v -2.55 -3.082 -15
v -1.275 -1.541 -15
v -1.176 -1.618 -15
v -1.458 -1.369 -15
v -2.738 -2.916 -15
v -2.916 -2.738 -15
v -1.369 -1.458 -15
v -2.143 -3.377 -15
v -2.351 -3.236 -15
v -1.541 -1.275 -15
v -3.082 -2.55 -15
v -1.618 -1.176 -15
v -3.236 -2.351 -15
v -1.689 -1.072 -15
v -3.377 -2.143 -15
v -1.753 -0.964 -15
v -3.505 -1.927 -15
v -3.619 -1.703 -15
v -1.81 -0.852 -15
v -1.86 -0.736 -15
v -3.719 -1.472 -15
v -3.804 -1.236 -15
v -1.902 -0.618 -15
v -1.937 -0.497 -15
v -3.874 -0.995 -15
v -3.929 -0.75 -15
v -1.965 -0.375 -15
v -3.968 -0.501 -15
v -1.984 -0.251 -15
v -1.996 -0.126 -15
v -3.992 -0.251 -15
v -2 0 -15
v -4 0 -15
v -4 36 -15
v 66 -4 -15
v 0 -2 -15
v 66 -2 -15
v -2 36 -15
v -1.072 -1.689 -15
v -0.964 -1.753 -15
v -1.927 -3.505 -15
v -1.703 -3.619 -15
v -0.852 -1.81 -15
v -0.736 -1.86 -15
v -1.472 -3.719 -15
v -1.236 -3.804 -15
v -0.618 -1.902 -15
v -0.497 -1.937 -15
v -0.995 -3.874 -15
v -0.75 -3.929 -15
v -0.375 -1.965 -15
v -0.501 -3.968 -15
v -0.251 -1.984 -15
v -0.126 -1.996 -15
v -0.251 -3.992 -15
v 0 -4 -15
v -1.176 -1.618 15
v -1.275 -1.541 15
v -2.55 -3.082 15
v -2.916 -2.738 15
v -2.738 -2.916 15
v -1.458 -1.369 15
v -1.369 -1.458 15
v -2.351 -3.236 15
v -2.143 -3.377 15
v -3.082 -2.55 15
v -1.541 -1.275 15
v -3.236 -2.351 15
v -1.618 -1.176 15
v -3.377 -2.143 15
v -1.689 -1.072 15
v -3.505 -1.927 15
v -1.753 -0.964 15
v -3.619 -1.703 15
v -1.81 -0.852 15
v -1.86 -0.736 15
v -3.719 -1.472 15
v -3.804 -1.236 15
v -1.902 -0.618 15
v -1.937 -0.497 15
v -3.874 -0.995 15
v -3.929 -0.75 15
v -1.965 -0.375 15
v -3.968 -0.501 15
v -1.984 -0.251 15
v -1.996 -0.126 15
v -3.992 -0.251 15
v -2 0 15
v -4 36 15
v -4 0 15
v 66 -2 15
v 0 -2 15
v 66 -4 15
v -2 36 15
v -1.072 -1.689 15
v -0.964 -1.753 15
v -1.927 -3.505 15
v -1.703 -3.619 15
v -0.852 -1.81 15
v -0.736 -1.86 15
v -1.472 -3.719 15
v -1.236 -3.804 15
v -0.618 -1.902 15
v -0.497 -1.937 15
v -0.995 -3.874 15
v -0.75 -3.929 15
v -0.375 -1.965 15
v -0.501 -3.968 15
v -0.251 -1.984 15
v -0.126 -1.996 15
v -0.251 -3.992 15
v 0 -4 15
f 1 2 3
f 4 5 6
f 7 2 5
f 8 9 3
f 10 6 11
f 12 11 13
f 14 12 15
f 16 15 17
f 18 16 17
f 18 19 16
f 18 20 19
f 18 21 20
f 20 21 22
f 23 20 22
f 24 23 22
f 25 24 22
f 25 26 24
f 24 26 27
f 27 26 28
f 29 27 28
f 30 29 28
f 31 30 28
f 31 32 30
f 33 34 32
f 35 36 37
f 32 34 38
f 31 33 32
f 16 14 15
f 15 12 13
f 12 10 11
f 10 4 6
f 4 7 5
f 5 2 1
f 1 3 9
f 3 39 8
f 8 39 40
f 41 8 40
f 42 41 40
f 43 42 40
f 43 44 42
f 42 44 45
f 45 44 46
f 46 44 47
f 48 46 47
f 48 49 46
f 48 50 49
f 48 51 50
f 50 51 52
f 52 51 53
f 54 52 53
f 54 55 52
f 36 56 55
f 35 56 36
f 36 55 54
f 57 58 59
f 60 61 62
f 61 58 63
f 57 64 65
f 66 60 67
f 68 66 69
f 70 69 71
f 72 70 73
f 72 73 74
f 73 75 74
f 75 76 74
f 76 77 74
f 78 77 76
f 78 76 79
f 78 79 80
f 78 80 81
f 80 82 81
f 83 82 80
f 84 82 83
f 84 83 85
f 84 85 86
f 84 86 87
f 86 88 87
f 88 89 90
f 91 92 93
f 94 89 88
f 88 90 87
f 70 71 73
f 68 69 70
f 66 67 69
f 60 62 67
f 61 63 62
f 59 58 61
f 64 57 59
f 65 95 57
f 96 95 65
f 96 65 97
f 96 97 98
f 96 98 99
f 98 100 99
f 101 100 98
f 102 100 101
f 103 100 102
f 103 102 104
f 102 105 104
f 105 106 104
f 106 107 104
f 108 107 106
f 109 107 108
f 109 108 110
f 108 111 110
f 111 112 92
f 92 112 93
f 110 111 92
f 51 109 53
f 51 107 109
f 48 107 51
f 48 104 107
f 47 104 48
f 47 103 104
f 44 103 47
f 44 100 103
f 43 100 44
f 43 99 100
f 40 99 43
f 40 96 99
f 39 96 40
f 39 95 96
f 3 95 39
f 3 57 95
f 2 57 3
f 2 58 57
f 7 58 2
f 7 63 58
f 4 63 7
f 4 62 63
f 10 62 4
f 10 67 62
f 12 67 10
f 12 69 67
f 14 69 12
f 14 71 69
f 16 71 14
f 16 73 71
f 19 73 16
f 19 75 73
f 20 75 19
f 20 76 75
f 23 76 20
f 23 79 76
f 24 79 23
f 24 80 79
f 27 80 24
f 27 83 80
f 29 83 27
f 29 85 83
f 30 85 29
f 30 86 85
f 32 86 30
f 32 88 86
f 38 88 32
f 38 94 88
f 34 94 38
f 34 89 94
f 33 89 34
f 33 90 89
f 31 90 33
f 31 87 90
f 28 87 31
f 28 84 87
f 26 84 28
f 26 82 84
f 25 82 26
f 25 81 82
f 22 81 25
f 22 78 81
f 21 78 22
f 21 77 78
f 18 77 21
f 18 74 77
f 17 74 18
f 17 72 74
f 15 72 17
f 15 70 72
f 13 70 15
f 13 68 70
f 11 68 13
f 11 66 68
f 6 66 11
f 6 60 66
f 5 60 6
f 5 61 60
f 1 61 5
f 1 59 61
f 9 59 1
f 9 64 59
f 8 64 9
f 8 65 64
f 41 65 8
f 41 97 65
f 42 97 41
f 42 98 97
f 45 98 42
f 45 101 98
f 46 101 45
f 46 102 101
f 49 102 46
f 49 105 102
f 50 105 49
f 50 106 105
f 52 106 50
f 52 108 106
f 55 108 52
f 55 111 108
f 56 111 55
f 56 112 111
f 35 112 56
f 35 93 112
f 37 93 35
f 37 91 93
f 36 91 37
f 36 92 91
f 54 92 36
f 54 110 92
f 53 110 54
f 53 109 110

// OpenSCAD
// Title: Sheet-Metal L-Bracket
// Description: Parametric 90-degree sheet-metal L-bracket with a single bend.
// Outside lengths: 70 mm and 40 mm, width: 30 mm, sheet thickness: 2.0 mm.

// --- Design Parameters ---
thickness = 2.0;         // Sheet metal thickness (mm)
inside_radius = 2.0;     // Inside bend radius (mm)
outside_length_1 = 70.0; // Outside length of flange 1 (mm)
outside_length_2 = 40.0; // Outside length of flange 2 (mm)
width = 30.0;            // Bracket width (mm)
k_factor = 0.45;         // K-factor for bend allowance
$fn = 100;               // Resolution for cylinder/circle sectors

// --- Calculations ---
outside_radius = inside_radius + thickness;
flat_1 = outside_length_1 - outside_radius;
flat_2 = outside_length_2 - outside_radius;
bend_angle = 90;
theta_rad = bend_angle * PI / 180;
bend_allowance = theta_rad * (inside_radius + k_factor * thickness);
flat_length = flat_1 + flat_2 + bend_allowance;

// --- Manifest Echo ---
echo(str("MAKERBENCH-SHEETMETAL: {\"thickness_mm\": ", thickness, ", \"bend_radius_mm\": ", inside_radius, ", \"flat_length_mm\": ", flat_length, "}"));

// --- Geometry Generation ---
module l_bracket() {
    linear_extrude(height = width, center = true) {
        union() {
            // Flange 1: Horizontal flange extending in the +x direction
            translate([0, -outside_radius])
                square([flat_1, thickness]);
            
            // Flange 2: Vertical flange extending in the +y direction
            translate([-outside_radius, 0])
                square([thickness, flat_2]);
            
            // Bend: 90-degree corner arc in the 3rd quadrant (x <= 0, y <= 0)
            intersection() {
                difference() {
                    circle(r = outside_radius);
                    circle(r = inside_radius);
                }
                translate([-outside_radius, -outside_radius])
                    square(outside_radius);
            }
        }
    }
}

l_bracket();
